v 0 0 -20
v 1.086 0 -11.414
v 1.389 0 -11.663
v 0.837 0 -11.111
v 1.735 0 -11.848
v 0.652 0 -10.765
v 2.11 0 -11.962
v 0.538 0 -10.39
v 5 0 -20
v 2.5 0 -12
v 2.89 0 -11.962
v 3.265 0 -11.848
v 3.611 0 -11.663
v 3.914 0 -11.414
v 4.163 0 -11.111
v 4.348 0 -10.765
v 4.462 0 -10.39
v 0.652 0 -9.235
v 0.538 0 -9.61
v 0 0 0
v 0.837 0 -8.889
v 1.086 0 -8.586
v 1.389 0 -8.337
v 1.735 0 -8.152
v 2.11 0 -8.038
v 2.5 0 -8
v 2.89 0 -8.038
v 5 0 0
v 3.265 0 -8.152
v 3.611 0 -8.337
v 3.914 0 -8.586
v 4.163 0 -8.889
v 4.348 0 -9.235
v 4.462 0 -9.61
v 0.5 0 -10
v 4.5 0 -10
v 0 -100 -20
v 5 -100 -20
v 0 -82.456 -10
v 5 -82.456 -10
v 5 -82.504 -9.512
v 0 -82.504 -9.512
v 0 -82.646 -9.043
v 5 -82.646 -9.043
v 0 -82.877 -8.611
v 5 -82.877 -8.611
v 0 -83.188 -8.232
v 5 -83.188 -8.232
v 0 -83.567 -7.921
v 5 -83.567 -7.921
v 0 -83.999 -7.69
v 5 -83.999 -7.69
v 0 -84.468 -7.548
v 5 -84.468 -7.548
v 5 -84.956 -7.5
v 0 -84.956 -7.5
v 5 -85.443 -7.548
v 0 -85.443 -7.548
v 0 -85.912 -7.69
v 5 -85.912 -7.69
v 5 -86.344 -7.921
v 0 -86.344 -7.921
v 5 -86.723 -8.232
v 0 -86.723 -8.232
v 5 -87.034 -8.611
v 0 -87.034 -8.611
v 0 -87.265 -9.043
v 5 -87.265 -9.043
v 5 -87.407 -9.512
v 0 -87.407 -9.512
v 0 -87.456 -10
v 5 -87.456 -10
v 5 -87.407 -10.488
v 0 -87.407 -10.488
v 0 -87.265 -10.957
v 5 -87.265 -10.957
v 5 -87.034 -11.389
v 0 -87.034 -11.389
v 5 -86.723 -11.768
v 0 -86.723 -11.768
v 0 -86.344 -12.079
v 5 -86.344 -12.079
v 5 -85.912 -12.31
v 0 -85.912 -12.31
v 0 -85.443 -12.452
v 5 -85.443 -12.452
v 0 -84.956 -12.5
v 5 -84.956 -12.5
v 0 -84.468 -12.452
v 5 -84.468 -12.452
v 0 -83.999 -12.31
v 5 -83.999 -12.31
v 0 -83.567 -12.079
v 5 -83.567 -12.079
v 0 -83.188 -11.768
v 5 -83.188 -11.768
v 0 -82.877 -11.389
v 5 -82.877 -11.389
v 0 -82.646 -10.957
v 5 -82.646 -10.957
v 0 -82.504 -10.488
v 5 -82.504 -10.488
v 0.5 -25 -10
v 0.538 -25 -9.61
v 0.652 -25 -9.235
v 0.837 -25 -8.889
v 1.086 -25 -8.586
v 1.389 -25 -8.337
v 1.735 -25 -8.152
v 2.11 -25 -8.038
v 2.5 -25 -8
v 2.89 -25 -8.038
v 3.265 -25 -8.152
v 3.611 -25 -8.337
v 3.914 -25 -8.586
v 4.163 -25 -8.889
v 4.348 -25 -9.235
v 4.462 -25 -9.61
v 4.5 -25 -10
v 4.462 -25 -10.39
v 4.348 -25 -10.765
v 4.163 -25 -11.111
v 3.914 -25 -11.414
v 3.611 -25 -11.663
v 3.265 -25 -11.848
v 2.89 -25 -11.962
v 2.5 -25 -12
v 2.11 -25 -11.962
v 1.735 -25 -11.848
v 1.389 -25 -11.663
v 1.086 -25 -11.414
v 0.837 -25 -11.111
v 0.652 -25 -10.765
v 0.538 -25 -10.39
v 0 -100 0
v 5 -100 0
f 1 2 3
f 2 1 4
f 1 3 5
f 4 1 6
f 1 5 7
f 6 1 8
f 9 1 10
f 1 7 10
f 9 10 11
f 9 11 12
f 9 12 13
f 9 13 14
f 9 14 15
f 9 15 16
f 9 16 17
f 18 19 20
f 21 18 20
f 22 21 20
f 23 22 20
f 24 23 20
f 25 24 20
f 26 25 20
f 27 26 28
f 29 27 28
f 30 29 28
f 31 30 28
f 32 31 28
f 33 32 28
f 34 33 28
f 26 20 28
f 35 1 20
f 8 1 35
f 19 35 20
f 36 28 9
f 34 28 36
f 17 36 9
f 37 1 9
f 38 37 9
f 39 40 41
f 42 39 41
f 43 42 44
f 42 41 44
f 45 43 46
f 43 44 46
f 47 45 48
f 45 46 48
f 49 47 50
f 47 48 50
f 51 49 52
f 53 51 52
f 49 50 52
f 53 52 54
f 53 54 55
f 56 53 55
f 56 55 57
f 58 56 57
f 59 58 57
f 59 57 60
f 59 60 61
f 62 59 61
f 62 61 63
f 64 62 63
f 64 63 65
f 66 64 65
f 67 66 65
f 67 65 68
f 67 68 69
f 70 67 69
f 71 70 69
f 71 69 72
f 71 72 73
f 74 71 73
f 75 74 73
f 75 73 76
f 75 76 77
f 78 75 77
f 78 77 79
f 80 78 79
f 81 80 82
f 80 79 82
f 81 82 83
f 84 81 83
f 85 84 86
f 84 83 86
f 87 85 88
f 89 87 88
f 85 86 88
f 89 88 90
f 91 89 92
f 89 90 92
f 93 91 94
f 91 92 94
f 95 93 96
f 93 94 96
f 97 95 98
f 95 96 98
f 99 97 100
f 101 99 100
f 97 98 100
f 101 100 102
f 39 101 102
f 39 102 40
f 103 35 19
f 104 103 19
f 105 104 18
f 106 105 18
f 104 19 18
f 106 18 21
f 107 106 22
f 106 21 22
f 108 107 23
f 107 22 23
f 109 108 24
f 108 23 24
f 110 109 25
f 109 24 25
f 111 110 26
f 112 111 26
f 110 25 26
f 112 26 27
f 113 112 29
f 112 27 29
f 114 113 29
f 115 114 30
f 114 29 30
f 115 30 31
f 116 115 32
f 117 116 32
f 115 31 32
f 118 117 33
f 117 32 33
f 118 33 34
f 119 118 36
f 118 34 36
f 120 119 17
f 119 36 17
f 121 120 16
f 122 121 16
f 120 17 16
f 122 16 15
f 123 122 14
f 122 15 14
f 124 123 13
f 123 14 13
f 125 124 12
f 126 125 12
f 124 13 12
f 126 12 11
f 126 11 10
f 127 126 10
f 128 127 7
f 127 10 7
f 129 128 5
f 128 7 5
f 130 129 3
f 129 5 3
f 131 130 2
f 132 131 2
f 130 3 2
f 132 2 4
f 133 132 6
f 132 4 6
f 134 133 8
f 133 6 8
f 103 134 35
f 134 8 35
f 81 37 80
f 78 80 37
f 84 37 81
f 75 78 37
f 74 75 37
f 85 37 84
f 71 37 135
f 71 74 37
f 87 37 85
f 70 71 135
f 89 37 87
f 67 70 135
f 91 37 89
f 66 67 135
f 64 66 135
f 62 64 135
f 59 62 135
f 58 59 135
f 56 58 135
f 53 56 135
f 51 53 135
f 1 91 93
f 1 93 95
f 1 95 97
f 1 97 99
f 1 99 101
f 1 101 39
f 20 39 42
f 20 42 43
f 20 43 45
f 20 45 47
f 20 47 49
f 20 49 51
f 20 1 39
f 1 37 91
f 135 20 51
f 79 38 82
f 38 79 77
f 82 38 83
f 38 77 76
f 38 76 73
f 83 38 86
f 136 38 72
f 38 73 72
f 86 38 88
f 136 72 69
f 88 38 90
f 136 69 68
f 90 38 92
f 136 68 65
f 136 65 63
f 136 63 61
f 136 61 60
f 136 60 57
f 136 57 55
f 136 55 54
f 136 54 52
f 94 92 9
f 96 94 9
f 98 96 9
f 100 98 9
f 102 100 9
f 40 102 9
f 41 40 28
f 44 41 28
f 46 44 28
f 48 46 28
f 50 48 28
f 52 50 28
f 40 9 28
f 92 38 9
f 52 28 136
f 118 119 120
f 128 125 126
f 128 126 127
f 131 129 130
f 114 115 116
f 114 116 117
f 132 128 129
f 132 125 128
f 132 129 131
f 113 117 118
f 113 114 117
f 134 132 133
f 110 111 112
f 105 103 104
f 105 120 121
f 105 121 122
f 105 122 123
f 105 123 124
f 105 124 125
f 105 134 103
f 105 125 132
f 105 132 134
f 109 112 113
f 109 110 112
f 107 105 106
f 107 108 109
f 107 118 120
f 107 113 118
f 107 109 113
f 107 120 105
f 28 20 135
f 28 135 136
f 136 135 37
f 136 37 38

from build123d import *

# Parameters (mm, degrees)
F0_W     = 5
F0_H     = 20
F1_DEPTH = 100
F2_R     = 2
F3_DEPTH = 25
F4_R     = 2.5
F5_DEPTH = 5.001


with BuildPart() as f1:
    # F0 (on Front) → F1 (new body)
    with BuildSketch(Plane.XZ):
        with Locations((2.5, -10)):
            Rectangle(F0_W, F0_H)
    extrude(amount=F1_DEPTH)

    # F2 (on face) → F3 (cut)
    with BuildSketch(Plane(origin=(0, 0, 0), x_dir=(-1, 0, 0), z_dir=(0, 1, 0))):
        with Locations((-2.5, -10)):
            Circle(F2_R)
    extrude(amount=-F3_DEPTH, mode=Mode.SUBTRACT)

    # F4 (on face) → F5 (cut, through all)
    with BuildSketch(Plane.YZ.offset(5)):
        with Locations((-84.955528, -10)):
            Circle(F4_R)
    extrude(amount=-F5_DEPTH, mode=Mode.SUBTRACT)


solid = f1.part
